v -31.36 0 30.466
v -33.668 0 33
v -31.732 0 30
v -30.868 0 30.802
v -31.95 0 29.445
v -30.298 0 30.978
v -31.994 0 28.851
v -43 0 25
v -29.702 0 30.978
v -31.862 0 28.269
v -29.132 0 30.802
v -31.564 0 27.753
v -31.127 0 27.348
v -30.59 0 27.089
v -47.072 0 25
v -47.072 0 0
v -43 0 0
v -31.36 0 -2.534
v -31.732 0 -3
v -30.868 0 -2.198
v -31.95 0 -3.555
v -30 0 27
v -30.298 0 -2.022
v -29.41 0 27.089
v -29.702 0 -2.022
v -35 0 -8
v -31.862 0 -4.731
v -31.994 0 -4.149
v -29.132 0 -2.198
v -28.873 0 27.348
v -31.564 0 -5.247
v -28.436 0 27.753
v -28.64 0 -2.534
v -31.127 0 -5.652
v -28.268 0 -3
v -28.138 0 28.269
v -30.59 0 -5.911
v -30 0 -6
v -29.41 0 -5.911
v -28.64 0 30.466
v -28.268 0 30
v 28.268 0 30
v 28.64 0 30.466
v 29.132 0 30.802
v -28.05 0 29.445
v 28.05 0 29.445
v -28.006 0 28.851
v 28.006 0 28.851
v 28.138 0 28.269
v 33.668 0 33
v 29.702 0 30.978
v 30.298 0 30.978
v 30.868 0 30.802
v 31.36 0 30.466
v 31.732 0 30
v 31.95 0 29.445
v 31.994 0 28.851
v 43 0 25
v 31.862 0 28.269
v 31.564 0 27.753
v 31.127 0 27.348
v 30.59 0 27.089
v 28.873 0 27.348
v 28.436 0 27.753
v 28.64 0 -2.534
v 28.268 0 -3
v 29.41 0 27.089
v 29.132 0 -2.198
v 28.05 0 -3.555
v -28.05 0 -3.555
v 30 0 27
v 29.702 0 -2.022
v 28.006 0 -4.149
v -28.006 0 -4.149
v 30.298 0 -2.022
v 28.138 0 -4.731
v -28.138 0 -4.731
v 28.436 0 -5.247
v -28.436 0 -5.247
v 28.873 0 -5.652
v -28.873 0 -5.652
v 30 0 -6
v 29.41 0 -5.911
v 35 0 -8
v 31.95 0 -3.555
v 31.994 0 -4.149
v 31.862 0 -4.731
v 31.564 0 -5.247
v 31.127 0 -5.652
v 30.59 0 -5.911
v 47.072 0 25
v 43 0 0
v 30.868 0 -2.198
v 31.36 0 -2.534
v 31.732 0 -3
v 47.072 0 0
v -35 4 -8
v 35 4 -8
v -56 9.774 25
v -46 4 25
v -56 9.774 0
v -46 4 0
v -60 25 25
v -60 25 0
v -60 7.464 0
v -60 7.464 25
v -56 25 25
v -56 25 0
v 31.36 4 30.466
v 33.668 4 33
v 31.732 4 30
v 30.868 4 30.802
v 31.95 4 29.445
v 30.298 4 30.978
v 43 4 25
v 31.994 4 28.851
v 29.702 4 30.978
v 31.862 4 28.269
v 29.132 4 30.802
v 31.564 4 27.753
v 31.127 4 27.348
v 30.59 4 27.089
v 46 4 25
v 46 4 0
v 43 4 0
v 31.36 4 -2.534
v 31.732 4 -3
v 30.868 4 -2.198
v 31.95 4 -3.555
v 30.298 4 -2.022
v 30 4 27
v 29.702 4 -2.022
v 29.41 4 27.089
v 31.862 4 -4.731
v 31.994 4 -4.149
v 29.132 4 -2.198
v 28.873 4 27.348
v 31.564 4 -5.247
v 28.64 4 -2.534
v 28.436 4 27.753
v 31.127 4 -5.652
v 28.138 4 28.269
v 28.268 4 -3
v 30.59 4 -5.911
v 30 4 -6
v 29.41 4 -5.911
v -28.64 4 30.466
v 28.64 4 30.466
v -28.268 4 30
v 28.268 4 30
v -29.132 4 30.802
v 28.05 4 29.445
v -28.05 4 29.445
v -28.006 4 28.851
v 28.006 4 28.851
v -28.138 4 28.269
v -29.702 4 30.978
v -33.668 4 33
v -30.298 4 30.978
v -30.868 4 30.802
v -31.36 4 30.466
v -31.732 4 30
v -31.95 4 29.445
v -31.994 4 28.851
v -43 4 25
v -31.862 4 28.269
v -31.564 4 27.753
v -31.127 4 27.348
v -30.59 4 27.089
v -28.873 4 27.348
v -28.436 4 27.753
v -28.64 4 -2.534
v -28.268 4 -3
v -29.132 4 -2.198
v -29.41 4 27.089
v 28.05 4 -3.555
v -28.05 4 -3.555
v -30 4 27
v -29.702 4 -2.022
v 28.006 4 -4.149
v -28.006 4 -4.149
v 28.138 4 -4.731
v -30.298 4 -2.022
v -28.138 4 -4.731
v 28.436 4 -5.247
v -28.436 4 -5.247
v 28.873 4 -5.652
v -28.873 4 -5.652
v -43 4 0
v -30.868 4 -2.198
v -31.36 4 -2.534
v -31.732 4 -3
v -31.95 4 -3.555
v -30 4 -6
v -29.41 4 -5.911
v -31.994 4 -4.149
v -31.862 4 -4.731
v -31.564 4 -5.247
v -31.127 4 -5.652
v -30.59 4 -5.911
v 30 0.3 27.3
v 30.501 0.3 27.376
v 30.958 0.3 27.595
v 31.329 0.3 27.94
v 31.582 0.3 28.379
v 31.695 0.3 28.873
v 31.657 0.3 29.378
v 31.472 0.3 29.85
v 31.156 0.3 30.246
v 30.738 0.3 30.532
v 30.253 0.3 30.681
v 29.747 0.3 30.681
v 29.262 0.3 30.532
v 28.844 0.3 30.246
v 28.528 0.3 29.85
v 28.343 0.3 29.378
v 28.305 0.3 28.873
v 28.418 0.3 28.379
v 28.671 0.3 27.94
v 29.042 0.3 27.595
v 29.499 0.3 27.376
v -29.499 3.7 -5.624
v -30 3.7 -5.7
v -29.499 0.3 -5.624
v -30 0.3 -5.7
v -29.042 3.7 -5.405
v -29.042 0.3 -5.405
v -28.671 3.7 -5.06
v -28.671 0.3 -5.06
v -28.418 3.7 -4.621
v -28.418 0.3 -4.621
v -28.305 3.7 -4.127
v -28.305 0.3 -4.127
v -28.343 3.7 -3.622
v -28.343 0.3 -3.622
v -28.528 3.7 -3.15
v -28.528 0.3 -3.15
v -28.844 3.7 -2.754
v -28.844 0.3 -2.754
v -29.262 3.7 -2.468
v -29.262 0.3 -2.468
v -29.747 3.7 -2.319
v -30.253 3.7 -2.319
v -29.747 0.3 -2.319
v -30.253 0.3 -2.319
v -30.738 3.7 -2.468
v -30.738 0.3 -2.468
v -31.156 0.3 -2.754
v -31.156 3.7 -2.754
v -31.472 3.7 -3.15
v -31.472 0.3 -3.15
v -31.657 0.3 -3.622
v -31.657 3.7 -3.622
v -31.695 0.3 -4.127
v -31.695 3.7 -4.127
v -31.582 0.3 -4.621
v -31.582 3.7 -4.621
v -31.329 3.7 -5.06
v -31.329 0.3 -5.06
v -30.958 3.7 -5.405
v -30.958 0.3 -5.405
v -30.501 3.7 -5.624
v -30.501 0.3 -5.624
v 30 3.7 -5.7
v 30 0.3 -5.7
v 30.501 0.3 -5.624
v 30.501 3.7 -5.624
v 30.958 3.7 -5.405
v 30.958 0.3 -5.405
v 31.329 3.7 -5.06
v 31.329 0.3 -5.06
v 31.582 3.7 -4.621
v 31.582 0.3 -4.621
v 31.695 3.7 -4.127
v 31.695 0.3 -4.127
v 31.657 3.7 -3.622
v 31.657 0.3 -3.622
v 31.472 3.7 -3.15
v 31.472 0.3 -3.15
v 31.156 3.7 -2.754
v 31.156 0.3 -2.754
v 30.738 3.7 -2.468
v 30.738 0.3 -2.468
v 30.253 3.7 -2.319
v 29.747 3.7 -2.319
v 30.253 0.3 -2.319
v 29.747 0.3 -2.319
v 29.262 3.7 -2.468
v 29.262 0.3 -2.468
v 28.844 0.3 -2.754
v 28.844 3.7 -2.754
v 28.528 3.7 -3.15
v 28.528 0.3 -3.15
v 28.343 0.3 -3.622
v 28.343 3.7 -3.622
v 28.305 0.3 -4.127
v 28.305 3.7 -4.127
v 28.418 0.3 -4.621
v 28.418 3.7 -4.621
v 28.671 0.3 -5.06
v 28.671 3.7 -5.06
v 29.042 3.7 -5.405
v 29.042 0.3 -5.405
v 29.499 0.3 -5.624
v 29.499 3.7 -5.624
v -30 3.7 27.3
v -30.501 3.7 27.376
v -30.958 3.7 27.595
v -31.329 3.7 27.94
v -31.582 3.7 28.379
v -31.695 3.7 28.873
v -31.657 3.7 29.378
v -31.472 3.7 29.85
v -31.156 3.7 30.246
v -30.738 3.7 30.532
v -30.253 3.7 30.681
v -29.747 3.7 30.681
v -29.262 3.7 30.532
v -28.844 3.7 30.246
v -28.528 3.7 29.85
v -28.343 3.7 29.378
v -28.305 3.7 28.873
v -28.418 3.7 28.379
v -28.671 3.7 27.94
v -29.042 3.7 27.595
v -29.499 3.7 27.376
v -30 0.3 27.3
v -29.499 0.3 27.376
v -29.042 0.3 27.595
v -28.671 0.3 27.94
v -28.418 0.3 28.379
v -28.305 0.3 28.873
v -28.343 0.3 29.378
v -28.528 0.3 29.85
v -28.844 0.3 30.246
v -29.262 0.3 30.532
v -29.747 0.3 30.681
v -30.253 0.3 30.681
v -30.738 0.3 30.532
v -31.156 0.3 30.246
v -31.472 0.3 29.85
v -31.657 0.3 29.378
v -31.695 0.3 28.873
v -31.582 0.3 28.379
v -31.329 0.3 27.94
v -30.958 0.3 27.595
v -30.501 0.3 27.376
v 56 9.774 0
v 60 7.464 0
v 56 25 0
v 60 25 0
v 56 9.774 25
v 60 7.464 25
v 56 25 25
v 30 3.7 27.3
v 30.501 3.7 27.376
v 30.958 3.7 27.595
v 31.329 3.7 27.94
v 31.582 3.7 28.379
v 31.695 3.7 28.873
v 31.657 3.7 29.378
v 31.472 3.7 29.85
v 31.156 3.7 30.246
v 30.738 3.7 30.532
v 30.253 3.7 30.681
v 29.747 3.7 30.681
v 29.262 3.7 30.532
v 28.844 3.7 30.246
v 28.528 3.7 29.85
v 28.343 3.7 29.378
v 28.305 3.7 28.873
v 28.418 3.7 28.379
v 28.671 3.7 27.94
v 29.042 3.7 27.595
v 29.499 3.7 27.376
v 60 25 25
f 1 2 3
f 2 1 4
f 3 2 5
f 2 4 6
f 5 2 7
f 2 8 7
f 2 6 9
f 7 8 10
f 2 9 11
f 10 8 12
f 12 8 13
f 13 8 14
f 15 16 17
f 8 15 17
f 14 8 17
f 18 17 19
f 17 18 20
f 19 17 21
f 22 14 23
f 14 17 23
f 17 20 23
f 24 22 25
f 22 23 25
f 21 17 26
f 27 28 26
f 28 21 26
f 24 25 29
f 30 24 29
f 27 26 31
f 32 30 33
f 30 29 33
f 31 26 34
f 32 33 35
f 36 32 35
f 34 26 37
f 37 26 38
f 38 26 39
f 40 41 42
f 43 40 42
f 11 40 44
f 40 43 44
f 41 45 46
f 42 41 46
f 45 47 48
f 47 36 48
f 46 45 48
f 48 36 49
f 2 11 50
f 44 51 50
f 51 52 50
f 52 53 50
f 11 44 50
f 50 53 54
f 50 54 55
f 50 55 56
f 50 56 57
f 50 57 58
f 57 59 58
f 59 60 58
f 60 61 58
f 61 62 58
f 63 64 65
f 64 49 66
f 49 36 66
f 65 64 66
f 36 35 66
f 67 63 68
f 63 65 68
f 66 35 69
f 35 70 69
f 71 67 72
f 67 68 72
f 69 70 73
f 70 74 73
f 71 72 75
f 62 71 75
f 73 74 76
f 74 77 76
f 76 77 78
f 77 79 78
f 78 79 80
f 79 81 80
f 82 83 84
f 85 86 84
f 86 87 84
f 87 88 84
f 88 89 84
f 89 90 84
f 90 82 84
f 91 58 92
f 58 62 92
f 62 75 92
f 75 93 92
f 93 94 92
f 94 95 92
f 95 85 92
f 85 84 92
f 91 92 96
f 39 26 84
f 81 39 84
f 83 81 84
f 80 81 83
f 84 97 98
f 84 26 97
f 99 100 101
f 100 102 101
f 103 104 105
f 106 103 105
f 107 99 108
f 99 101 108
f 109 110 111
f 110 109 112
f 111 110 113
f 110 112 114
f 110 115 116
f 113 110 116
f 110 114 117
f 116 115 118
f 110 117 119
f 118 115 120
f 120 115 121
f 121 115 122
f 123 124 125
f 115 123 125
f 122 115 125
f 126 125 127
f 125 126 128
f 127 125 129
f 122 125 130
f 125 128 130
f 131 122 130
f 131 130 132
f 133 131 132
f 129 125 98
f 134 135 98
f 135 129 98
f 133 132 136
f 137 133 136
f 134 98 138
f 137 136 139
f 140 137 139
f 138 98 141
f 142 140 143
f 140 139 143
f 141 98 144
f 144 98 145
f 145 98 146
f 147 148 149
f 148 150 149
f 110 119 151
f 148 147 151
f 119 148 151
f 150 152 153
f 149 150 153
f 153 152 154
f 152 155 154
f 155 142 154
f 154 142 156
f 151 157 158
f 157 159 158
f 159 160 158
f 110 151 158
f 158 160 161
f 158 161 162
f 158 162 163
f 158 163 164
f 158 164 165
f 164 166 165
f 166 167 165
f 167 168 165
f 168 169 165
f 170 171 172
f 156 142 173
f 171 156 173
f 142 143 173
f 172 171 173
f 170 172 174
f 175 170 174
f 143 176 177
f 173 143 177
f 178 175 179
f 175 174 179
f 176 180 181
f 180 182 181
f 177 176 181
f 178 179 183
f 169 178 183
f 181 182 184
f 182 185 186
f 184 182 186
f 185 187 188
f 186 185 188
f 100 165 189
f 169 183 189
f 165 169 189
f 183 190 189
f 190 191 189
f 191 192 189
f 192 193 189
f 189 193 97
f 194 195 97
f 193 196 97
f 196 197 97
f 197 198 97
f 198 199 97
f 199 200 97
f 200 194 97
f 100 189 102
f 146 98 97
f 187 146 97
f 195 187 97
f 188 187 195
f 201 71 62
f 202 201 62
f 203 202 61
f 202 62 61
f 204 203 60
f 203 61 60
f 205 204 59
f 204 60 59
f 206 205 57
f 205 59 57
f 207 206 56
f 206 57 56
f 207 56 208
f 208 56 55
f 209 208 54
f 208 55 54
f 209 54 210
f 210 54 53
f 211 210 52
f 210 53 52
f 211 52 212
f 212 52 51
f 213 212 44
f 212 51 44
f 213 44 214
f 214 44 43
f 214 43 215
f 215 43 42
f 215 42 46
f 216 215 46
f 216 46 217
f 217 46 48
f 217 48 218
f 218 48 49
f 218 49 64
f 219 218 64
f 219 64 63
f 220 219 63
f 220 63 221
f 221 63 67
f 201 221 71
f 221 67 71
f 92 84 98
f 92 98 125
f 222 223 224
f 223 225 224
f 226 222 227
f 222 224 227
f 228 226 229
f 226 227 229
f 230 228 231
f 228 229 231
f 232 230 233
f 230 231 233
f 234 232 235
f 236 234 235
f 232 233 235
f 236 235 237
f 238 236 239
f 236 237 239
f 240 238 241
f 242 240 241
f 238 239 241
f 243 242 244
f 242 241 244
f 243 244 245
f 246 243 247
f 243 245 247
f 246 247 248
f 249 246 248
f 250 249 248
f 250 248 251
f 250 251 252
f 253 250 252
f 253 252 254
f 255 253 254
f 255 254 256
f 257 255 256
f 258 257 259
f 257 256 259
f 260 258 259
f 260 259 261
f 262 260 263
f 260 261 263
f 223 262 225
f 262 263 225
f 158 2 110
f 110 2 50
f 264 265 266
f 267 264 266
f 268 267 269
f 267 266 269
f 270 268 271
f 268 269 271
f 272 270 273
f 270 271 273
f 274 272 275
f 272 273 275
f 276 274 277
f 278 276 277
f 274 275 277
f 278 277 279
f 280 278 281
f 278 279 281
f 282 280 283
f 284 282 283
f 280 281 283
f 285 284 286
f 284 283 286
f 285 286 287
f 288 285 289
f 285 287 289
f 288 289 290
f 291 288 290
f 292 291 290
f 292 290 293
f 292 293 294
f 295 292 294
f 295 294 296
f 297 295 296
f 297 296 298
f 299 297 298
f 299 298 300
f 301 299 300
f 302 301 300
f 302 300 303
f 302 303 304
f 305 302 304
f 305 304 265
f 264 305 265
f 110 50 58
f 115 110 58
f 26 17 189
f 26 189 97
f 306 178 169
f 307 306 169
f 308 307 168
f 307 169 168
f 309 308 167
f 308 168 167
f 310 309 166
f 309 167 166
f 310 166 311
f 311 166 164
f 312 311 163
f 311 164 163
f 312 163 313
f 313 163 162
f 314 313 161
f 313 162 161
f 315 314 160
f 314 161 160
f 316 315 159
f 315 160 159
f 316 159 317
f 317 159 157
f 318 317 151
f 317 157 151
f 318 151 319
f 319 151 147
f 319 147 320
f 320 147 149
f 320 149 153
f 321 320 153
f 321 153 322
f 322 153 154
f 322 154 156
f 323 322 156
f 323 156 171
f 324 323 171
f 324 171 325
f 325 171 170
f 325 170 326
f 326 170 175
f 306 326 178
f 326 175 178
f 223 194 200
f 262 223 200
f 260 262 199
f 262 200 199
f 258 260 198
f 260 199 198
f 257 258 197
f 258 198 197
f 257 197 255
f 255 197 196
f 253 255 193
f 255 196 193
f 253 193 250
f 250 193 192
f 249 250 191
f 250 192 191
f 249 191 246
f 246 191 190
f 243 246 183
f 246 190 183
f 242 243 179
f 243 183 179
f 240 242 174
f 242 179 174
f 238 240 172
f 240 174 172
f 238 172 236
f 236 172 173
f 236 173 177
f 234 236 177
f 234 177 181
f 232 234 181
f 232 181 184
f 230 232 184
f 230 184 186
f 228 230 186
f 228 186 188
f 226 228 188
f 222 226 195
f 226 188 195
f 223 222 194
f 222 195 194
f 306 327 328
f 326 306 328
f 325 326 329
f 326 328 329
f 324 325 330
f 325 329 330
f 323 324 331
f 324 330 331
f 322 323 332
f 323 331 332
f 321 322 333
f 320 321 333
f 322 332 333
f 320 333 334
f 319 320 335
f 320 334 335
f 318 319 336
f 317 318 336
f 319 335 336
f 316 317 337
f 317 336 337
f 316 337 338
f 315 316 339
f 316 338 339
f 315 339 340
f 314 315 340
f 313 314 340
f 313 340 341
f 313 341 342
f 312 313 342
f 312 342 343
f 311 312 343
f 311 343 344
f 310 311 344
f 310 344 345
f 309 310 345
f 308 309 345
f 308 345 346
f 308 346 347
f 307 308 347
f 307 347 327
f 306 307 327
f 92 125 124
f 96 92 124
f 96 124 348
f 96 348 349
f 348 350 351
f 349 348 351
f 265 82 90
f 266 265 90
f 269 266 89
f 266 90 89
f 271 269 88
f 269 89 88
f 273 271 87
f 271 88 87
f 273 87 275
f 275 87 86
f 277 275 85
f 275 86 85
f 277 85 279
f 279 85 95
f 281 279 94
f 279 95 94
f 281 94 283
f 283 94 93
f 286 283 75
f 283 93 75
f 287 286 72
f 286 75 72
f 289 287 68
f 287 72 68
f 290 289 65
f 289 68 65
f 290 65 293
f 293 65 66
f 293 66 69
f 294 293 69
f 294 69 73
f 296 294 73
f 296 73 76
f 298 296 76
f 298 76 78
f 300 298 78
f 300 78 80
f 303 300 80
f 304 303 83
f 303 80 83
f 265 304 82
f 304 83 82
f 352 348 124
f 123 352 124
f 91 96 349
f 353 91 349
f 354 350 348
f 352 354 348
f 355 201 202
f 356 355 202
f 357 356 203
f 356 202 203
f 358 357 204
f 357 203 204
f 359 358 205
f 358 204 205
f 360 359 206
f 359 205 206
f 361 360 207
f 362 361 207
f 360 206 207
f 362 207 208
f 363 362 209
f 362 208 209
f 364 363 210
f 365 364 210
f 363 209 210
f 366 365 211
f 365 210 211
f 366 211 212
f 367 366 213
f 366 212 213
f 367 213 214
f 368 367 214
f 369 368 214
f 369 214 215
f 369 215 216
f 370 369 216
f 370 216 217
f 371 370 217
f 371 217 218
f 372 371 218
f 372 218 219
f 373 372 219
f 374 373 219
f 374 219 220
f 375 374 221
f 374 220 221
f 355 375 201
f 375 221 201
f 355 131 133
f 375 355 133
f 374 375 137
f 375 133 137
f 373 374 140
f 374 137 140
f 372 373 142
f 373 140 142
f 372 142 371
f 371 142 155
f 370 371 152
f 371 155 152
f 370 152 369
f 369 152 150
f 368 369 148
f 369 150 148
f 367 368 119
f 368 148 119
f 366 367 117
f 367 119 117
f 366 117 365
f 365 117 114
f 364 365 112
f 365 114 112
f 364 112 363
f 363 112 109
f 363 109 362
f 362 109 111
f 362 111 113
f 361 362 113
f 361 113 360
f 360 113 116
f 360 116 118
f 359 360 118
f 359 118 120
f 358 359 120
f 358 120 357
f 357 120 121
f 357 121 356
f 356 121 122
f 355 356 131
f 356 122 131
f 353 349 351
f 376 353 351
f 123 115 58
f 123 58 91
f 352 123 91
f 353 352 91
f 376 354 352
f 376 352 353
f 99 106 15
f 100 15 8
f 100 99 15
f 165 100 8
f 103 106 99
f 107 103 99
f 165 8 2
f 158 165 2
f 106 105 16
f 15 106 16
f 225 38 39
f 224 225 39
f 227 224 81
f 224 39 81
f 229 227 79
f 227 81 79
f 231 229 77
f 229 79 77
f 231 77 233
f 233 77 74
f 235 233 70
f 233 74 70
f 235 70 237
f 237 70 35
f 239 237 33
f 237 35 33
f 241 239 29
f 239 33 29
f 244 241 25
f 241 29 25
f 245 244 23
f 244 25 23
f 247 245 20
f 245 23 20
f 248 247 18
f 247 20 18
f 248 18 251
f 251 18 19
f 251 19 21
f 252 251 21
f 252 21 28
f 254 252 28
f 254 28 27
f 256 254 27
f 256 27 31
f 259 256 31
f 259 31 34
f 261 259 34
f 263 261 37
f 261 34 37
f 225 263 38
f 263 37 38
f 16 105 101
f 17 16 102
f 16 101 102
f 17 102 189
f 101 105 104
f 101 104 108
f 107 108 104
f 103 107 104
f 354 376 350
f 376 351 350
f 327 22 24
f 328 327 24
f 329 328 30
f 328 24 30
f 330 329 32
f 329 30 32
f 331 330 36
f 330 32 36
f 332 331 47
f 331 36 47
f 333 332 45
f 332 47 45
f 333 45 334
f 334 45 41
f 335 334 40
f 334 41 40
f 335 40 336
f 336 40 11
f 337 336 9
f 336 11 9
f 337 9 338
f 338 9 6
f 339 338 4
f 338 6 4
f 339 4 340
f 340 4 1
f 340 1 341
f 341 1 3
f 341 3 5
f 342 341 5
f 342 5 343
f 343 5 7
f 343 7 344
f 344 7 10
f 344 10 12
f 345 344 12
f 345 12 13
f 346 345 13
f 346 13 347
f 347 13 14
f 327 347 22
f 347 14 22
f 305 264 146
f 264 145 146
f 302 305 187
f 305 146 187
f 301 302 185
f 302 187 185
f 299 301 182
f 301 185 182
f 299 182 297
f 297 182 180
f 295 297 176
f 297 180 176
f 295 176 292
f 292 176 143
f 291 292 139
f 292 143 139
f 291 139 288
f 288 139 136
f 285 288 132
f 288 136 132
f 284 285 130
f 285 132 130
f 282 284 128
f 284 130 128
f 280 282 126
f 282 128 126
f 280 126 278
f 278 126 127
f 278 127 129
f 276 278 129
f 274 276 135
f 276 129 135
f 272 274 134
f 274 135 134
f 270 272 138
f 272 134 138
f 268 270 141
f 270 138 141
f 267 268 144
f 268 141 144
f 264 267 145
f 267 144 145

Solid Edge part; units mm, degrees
sketch "Sketch1" plane through (0, 0, 0) normal (0, 0, 1) x (1, 0, 0)
  line L0 (0, 0) -> (47.0718, 0)
  line L1 (47.0718, 0) -> (60, 7.4641)
  line L2 (60, 7.4641) -> (60, 25)
  line L3 (60, 25) -> (56, 25)
  line L4 (56, 25) -> (56, 9.7735)
  line L5 (56, 9.7735) -> (46, 4)
  line L6 (46, 4) -> (0, 4)
  line L7 (0, 0) -> (0, 4)
  dimension "D1" = 60
  dimension "D2" = 4
  dimension "D3" = 4
  dimension "D4" = 10
  dimension "D5" = 25
extrude "Protrusion1" add sketch "Sketch1" along normal blind 25
mirror "Mirror1" about plane through (0, 0, 0) normal (1, 0, 0) of "Protrusion1"
sketch "Sketch2" plane through (0, 0, 15) normal (0, -1, 0) x (1, 0, 0)
  line L0 (-43, -15) -> (-35, -23)
  line L1 (-35, -23) -> (35, -23)
  line L2 (35, -23) -> (43, -15)
  line L3 (43, -15) -> (-43, -15)
  dimension "D1" = 8
  dimension "D2" = 86
  dimension "D3" = 70
extrude "Protrusion2" add sketch "Sketch2" against normal up to vertex (4 mm away)
hole "Hole1" at (-30, 0, -4) direction (0, 1, 0) diameter 3.4 end up to next start chamfer 0.3 start chamfer angle 45 end chamfer 0.3 end chamfer angle 45
hole "Hole2" at (30, 0, -4) direction (0, 1, 0) diameter 3.4 end up to next start chamfer 0.3 start chamfer angle 45 end chamfer 0.3 end chamfer angle 45
sketch "Sketch3" plane through (0, 0, 8.5) normal (0, -1, 0) x (1, 0, 0)
  line L0 (-43, 16.5) -> (43, 16.5)
  line L1 (33.6676, 24.5) -> (43, 16.5)
  line L2 (-33.6676, 24.5) -> (33.6676, 24.5)
  line L3 (-43, 16.5) -> (-33.6676, 24.5)
  dimension "D1" = 8
extrude "Protrusion3" add sketch "Sketch3" against normal up to vertex (4 mm away)
hole "Hole3" at (-30, 0, 29) direction (0, 1, 0) diameter 3.4 end up to next start chamfer 0.3 start chamfer angle 45 end chamfer 0.3 end chamfer angle 45
hole "Hole4" at (30, 0, 29) direction (0, 1, 0) diameter 3.4 end up to next start chamfer 0.3 start chamfer angle 45 end chamfer 0.3 end chamfer angle 45
properties material "Polyethylene, low density"
